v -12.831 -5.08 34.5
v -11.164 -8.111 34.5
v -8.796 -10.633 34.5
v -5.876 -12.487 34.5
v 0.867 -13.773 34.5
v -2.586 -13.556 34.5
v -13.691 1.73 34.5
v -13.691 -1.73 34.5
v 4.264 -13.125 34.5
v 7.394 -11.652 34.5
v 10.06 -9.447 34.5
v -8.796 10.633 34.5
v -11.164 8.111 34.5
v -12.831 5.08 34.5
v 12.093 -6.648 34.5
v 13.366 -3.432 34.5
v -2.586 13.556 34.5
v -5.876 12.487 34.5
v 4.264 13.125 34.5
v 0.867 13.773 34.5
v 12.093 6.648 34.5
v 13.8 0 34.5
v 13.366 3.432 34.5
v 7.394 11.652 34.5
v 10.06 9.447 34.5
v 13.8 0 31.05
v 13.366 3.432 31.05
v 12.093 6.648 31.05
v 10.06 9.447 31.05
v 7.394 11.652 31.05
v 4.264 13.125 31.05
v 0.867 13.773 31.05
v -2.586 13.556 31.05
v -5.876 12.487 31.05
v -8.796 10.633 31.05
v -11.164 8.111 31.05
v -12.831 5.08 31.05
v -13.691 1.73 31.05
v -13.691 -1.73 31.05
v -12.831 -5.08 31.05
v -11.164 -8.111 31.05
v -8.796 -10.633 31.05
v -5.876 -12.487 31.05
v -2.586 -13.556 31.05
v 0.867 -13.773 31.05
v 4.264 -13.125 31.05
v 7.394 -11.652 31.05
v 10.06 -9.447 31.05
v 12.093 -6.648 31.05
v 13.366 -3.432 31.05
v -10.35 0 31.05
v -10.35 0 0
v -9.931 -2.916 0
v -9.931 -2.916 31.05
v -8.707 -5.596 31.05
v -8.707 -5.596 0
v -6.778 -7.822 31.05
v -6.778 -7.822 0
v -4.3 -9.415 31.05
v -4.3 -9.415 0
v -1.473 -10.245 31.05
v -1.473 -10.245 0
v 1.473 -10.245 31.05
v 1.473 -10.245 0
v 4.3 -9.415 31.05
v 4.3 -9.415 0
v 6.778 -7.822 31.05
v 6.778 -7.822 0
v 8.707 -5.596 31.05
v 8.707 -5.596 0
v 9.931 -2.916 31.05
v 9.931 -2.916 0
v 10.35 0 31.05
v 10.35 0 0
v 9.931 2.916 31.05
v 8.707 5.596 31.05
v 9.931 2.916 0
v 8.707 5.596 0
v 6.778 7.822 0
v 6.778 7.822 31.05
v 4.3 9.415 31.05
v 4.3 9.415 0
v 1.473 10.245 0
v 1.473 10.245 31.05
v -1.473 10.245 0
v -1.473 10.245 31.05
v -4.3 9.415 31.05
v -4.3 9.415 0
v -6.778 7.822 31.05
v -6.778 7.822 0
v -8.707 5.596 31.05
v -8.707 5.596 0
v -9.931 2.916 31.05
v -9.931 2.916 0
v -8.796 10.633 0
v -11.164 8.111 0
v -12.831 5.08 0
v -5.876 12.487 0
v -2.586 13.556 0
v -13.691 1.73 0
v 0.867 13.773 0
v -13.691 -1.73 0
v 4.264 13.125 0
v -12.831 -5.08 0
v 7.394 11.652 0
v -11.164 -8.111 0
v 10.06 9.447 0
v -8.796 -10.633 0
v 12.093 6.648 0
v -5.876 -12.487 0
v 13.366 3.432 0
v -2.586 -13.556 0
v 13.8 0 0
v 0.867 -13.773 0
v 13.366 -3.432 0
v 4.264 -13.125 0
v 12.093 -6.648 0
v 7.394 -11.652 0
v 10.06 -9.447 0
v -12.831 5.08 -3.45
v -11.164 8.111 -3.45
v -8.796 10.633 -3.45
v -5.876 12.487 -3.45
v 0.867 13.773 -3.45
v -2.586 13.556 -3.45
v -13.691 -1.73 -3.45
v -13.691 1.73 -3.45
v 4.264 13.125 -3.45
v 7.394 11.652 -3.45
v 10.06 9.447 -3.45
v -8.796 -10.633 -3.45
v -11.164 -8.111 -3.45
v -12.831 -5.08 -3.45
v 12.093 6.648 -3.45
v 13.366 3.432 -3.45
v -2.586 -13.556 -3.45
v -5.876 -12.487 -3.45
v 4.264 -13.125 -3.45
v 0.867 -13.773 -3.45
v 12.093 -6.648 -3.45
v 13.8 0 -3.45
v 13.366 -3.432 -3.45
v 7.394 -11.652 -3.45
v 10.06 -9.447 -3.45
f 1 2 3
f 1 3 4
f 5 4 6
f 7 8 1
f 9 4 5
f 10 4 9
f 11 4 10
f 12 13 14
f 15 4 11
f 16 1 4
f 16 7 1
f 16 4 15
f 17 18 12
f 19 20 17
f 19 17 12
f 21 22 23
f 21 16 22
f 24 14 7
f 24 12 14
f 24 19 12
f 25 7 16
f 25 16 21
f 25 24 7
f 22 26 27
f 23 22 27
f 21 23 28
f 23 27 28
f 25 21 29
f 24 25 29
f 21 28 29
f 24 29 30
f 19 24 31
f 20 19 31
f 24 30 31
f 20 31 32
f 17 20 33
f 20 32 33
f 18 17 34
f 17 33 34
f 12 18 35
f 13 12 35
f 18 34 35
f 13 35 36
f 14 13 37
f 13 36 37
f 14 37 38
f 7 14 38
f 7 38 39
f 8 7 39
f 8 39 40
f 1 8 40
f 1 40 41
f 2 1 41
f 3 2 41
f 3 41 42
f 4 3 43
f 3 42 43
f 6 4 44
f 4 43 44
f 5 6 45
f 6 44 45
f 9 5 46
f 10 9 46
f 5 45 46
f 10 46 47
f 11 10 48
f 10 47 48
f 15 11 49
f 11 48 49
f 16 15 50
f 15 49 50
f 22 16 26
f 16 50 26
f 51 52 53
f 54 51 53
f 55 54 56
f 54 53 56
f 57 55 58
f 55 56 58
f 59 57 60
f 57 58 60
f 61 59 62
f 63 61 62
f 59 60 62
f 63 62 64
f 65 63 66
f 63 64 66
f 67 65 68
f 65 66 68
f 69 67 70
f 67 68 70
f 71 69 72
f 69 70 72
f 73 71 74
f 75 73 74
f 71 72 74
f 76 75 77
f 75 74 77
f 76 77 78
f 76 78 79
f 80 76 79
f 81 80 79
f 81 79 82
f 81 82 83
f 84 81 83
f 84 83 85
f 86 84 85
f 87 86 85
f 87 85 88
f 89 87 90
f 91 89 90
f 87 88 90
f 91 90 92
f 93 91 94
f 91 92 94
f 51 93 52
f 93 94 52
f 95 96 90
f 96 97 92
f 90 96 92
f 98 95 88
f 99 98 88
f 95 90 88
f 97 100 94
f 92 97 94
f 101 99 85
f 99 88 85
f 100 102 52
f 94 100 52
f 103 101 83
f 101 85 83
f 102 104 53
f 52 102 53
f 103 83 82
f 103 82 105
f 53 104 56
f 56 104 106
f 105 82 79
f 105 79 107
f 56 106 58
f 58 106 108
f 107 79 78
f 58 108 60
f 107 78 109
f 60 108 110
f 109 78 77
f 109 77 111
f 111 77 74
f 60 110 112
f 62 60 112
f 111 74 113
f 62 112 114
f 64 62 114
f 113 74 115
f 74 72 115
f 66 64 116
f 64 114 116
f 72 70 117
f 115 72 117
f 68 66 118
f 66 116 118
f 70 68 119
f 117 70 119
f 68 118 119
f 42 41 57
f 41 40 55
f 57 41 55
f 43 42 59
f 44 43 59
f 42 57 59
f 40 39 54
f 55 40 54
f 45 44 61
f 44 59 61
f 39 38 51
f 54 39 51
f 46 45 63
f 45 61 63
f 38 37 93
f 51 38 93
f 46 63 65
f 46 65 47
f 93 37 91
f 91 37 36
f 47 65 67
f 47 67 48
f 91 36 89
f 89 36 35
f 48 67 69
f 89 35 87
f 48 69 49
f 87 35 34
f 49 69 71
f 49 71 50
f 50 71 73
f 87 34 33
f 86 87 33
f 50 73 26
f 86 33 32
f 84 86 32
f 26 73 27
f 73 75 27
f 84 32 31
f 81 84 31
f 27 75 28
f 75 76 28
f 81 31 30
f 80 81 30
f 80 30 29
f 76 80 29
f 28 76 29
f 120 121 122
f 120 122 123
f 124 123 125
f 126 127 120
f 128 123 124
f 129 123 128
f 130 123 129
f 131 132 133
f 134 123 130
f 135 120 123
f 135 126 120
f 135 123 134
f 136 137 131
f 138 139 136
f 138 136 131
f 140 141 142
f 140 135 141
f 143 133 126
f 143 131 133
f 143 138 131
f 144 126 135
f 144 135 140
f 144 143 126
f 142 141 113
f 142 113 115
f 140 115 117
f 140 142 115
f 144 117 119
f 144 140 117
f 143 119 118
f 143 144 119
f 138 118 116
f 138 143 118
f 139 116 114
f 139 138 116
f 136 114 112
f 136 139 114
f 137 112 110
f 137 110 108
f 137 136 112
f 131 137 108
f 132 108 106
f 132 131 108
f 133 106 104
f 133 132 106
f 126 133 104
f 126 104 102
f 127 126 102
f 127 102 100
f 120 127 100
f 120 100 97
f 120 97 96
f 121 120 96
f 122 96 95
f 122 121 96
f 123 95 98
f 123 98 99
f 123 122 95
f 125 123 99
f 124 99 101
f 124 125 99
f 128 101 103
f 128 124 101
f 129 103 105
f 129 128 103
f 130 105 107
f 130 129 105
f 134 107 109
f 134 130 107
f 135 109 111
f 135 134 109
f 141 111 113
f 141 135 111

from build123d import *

# Parameters (mm, degrees)
SKETCH_1_R      = 30
EXTRUDE_1_DEPTH = 90
SKETCH_2_R      = 40
EXTRUDE_2_DEPTH = 10
EXTRUDE_START   = 10
SKETCH_3_R      = 40
EXTRUDE_3_DEPTH = 10
SCALE_1_SCALE   = 0.345


with BuildPart() as part:
    # 草图1 → 凸台-拉伸1 (new body)
    with BuildSketch(Plane.XY):
        with Locations(Location((0, 0, 0), (0, 0, 180))):
            Circle(SKETCH_1_R)
    extrude(amount=EXTRUDE_1_DEPTH)

    # 草图2 → 凸台-拉伸2 (add)
    with BuildSketch(Plane.XY.offset(90)):
        Circle(SKETCH_2_R)
    extrude(amount=EXTRUDE_2_DEPTH)

    # 草图3 → 凸台-拉伸3 (add)
    with BuildSketch(Plane(origin=(0, 0, 0), x_dir=(-1, 0, 0), z_dir=(0, 0, -1)).offset(EXTRUDE_START)):
        with Locations(Location((0, 0, 0), (0, 0, 180))):
            Circle(SKETCH_3_R)
    extrude(amount=-EXTRUDE_3_DEPTH)


with BuildPart() as part_1:
    # 缩放比例1: scaled about (0, 0, 0)
    add(part.part.scale(SCALE_1_SCALE))


solid = part_1.part
